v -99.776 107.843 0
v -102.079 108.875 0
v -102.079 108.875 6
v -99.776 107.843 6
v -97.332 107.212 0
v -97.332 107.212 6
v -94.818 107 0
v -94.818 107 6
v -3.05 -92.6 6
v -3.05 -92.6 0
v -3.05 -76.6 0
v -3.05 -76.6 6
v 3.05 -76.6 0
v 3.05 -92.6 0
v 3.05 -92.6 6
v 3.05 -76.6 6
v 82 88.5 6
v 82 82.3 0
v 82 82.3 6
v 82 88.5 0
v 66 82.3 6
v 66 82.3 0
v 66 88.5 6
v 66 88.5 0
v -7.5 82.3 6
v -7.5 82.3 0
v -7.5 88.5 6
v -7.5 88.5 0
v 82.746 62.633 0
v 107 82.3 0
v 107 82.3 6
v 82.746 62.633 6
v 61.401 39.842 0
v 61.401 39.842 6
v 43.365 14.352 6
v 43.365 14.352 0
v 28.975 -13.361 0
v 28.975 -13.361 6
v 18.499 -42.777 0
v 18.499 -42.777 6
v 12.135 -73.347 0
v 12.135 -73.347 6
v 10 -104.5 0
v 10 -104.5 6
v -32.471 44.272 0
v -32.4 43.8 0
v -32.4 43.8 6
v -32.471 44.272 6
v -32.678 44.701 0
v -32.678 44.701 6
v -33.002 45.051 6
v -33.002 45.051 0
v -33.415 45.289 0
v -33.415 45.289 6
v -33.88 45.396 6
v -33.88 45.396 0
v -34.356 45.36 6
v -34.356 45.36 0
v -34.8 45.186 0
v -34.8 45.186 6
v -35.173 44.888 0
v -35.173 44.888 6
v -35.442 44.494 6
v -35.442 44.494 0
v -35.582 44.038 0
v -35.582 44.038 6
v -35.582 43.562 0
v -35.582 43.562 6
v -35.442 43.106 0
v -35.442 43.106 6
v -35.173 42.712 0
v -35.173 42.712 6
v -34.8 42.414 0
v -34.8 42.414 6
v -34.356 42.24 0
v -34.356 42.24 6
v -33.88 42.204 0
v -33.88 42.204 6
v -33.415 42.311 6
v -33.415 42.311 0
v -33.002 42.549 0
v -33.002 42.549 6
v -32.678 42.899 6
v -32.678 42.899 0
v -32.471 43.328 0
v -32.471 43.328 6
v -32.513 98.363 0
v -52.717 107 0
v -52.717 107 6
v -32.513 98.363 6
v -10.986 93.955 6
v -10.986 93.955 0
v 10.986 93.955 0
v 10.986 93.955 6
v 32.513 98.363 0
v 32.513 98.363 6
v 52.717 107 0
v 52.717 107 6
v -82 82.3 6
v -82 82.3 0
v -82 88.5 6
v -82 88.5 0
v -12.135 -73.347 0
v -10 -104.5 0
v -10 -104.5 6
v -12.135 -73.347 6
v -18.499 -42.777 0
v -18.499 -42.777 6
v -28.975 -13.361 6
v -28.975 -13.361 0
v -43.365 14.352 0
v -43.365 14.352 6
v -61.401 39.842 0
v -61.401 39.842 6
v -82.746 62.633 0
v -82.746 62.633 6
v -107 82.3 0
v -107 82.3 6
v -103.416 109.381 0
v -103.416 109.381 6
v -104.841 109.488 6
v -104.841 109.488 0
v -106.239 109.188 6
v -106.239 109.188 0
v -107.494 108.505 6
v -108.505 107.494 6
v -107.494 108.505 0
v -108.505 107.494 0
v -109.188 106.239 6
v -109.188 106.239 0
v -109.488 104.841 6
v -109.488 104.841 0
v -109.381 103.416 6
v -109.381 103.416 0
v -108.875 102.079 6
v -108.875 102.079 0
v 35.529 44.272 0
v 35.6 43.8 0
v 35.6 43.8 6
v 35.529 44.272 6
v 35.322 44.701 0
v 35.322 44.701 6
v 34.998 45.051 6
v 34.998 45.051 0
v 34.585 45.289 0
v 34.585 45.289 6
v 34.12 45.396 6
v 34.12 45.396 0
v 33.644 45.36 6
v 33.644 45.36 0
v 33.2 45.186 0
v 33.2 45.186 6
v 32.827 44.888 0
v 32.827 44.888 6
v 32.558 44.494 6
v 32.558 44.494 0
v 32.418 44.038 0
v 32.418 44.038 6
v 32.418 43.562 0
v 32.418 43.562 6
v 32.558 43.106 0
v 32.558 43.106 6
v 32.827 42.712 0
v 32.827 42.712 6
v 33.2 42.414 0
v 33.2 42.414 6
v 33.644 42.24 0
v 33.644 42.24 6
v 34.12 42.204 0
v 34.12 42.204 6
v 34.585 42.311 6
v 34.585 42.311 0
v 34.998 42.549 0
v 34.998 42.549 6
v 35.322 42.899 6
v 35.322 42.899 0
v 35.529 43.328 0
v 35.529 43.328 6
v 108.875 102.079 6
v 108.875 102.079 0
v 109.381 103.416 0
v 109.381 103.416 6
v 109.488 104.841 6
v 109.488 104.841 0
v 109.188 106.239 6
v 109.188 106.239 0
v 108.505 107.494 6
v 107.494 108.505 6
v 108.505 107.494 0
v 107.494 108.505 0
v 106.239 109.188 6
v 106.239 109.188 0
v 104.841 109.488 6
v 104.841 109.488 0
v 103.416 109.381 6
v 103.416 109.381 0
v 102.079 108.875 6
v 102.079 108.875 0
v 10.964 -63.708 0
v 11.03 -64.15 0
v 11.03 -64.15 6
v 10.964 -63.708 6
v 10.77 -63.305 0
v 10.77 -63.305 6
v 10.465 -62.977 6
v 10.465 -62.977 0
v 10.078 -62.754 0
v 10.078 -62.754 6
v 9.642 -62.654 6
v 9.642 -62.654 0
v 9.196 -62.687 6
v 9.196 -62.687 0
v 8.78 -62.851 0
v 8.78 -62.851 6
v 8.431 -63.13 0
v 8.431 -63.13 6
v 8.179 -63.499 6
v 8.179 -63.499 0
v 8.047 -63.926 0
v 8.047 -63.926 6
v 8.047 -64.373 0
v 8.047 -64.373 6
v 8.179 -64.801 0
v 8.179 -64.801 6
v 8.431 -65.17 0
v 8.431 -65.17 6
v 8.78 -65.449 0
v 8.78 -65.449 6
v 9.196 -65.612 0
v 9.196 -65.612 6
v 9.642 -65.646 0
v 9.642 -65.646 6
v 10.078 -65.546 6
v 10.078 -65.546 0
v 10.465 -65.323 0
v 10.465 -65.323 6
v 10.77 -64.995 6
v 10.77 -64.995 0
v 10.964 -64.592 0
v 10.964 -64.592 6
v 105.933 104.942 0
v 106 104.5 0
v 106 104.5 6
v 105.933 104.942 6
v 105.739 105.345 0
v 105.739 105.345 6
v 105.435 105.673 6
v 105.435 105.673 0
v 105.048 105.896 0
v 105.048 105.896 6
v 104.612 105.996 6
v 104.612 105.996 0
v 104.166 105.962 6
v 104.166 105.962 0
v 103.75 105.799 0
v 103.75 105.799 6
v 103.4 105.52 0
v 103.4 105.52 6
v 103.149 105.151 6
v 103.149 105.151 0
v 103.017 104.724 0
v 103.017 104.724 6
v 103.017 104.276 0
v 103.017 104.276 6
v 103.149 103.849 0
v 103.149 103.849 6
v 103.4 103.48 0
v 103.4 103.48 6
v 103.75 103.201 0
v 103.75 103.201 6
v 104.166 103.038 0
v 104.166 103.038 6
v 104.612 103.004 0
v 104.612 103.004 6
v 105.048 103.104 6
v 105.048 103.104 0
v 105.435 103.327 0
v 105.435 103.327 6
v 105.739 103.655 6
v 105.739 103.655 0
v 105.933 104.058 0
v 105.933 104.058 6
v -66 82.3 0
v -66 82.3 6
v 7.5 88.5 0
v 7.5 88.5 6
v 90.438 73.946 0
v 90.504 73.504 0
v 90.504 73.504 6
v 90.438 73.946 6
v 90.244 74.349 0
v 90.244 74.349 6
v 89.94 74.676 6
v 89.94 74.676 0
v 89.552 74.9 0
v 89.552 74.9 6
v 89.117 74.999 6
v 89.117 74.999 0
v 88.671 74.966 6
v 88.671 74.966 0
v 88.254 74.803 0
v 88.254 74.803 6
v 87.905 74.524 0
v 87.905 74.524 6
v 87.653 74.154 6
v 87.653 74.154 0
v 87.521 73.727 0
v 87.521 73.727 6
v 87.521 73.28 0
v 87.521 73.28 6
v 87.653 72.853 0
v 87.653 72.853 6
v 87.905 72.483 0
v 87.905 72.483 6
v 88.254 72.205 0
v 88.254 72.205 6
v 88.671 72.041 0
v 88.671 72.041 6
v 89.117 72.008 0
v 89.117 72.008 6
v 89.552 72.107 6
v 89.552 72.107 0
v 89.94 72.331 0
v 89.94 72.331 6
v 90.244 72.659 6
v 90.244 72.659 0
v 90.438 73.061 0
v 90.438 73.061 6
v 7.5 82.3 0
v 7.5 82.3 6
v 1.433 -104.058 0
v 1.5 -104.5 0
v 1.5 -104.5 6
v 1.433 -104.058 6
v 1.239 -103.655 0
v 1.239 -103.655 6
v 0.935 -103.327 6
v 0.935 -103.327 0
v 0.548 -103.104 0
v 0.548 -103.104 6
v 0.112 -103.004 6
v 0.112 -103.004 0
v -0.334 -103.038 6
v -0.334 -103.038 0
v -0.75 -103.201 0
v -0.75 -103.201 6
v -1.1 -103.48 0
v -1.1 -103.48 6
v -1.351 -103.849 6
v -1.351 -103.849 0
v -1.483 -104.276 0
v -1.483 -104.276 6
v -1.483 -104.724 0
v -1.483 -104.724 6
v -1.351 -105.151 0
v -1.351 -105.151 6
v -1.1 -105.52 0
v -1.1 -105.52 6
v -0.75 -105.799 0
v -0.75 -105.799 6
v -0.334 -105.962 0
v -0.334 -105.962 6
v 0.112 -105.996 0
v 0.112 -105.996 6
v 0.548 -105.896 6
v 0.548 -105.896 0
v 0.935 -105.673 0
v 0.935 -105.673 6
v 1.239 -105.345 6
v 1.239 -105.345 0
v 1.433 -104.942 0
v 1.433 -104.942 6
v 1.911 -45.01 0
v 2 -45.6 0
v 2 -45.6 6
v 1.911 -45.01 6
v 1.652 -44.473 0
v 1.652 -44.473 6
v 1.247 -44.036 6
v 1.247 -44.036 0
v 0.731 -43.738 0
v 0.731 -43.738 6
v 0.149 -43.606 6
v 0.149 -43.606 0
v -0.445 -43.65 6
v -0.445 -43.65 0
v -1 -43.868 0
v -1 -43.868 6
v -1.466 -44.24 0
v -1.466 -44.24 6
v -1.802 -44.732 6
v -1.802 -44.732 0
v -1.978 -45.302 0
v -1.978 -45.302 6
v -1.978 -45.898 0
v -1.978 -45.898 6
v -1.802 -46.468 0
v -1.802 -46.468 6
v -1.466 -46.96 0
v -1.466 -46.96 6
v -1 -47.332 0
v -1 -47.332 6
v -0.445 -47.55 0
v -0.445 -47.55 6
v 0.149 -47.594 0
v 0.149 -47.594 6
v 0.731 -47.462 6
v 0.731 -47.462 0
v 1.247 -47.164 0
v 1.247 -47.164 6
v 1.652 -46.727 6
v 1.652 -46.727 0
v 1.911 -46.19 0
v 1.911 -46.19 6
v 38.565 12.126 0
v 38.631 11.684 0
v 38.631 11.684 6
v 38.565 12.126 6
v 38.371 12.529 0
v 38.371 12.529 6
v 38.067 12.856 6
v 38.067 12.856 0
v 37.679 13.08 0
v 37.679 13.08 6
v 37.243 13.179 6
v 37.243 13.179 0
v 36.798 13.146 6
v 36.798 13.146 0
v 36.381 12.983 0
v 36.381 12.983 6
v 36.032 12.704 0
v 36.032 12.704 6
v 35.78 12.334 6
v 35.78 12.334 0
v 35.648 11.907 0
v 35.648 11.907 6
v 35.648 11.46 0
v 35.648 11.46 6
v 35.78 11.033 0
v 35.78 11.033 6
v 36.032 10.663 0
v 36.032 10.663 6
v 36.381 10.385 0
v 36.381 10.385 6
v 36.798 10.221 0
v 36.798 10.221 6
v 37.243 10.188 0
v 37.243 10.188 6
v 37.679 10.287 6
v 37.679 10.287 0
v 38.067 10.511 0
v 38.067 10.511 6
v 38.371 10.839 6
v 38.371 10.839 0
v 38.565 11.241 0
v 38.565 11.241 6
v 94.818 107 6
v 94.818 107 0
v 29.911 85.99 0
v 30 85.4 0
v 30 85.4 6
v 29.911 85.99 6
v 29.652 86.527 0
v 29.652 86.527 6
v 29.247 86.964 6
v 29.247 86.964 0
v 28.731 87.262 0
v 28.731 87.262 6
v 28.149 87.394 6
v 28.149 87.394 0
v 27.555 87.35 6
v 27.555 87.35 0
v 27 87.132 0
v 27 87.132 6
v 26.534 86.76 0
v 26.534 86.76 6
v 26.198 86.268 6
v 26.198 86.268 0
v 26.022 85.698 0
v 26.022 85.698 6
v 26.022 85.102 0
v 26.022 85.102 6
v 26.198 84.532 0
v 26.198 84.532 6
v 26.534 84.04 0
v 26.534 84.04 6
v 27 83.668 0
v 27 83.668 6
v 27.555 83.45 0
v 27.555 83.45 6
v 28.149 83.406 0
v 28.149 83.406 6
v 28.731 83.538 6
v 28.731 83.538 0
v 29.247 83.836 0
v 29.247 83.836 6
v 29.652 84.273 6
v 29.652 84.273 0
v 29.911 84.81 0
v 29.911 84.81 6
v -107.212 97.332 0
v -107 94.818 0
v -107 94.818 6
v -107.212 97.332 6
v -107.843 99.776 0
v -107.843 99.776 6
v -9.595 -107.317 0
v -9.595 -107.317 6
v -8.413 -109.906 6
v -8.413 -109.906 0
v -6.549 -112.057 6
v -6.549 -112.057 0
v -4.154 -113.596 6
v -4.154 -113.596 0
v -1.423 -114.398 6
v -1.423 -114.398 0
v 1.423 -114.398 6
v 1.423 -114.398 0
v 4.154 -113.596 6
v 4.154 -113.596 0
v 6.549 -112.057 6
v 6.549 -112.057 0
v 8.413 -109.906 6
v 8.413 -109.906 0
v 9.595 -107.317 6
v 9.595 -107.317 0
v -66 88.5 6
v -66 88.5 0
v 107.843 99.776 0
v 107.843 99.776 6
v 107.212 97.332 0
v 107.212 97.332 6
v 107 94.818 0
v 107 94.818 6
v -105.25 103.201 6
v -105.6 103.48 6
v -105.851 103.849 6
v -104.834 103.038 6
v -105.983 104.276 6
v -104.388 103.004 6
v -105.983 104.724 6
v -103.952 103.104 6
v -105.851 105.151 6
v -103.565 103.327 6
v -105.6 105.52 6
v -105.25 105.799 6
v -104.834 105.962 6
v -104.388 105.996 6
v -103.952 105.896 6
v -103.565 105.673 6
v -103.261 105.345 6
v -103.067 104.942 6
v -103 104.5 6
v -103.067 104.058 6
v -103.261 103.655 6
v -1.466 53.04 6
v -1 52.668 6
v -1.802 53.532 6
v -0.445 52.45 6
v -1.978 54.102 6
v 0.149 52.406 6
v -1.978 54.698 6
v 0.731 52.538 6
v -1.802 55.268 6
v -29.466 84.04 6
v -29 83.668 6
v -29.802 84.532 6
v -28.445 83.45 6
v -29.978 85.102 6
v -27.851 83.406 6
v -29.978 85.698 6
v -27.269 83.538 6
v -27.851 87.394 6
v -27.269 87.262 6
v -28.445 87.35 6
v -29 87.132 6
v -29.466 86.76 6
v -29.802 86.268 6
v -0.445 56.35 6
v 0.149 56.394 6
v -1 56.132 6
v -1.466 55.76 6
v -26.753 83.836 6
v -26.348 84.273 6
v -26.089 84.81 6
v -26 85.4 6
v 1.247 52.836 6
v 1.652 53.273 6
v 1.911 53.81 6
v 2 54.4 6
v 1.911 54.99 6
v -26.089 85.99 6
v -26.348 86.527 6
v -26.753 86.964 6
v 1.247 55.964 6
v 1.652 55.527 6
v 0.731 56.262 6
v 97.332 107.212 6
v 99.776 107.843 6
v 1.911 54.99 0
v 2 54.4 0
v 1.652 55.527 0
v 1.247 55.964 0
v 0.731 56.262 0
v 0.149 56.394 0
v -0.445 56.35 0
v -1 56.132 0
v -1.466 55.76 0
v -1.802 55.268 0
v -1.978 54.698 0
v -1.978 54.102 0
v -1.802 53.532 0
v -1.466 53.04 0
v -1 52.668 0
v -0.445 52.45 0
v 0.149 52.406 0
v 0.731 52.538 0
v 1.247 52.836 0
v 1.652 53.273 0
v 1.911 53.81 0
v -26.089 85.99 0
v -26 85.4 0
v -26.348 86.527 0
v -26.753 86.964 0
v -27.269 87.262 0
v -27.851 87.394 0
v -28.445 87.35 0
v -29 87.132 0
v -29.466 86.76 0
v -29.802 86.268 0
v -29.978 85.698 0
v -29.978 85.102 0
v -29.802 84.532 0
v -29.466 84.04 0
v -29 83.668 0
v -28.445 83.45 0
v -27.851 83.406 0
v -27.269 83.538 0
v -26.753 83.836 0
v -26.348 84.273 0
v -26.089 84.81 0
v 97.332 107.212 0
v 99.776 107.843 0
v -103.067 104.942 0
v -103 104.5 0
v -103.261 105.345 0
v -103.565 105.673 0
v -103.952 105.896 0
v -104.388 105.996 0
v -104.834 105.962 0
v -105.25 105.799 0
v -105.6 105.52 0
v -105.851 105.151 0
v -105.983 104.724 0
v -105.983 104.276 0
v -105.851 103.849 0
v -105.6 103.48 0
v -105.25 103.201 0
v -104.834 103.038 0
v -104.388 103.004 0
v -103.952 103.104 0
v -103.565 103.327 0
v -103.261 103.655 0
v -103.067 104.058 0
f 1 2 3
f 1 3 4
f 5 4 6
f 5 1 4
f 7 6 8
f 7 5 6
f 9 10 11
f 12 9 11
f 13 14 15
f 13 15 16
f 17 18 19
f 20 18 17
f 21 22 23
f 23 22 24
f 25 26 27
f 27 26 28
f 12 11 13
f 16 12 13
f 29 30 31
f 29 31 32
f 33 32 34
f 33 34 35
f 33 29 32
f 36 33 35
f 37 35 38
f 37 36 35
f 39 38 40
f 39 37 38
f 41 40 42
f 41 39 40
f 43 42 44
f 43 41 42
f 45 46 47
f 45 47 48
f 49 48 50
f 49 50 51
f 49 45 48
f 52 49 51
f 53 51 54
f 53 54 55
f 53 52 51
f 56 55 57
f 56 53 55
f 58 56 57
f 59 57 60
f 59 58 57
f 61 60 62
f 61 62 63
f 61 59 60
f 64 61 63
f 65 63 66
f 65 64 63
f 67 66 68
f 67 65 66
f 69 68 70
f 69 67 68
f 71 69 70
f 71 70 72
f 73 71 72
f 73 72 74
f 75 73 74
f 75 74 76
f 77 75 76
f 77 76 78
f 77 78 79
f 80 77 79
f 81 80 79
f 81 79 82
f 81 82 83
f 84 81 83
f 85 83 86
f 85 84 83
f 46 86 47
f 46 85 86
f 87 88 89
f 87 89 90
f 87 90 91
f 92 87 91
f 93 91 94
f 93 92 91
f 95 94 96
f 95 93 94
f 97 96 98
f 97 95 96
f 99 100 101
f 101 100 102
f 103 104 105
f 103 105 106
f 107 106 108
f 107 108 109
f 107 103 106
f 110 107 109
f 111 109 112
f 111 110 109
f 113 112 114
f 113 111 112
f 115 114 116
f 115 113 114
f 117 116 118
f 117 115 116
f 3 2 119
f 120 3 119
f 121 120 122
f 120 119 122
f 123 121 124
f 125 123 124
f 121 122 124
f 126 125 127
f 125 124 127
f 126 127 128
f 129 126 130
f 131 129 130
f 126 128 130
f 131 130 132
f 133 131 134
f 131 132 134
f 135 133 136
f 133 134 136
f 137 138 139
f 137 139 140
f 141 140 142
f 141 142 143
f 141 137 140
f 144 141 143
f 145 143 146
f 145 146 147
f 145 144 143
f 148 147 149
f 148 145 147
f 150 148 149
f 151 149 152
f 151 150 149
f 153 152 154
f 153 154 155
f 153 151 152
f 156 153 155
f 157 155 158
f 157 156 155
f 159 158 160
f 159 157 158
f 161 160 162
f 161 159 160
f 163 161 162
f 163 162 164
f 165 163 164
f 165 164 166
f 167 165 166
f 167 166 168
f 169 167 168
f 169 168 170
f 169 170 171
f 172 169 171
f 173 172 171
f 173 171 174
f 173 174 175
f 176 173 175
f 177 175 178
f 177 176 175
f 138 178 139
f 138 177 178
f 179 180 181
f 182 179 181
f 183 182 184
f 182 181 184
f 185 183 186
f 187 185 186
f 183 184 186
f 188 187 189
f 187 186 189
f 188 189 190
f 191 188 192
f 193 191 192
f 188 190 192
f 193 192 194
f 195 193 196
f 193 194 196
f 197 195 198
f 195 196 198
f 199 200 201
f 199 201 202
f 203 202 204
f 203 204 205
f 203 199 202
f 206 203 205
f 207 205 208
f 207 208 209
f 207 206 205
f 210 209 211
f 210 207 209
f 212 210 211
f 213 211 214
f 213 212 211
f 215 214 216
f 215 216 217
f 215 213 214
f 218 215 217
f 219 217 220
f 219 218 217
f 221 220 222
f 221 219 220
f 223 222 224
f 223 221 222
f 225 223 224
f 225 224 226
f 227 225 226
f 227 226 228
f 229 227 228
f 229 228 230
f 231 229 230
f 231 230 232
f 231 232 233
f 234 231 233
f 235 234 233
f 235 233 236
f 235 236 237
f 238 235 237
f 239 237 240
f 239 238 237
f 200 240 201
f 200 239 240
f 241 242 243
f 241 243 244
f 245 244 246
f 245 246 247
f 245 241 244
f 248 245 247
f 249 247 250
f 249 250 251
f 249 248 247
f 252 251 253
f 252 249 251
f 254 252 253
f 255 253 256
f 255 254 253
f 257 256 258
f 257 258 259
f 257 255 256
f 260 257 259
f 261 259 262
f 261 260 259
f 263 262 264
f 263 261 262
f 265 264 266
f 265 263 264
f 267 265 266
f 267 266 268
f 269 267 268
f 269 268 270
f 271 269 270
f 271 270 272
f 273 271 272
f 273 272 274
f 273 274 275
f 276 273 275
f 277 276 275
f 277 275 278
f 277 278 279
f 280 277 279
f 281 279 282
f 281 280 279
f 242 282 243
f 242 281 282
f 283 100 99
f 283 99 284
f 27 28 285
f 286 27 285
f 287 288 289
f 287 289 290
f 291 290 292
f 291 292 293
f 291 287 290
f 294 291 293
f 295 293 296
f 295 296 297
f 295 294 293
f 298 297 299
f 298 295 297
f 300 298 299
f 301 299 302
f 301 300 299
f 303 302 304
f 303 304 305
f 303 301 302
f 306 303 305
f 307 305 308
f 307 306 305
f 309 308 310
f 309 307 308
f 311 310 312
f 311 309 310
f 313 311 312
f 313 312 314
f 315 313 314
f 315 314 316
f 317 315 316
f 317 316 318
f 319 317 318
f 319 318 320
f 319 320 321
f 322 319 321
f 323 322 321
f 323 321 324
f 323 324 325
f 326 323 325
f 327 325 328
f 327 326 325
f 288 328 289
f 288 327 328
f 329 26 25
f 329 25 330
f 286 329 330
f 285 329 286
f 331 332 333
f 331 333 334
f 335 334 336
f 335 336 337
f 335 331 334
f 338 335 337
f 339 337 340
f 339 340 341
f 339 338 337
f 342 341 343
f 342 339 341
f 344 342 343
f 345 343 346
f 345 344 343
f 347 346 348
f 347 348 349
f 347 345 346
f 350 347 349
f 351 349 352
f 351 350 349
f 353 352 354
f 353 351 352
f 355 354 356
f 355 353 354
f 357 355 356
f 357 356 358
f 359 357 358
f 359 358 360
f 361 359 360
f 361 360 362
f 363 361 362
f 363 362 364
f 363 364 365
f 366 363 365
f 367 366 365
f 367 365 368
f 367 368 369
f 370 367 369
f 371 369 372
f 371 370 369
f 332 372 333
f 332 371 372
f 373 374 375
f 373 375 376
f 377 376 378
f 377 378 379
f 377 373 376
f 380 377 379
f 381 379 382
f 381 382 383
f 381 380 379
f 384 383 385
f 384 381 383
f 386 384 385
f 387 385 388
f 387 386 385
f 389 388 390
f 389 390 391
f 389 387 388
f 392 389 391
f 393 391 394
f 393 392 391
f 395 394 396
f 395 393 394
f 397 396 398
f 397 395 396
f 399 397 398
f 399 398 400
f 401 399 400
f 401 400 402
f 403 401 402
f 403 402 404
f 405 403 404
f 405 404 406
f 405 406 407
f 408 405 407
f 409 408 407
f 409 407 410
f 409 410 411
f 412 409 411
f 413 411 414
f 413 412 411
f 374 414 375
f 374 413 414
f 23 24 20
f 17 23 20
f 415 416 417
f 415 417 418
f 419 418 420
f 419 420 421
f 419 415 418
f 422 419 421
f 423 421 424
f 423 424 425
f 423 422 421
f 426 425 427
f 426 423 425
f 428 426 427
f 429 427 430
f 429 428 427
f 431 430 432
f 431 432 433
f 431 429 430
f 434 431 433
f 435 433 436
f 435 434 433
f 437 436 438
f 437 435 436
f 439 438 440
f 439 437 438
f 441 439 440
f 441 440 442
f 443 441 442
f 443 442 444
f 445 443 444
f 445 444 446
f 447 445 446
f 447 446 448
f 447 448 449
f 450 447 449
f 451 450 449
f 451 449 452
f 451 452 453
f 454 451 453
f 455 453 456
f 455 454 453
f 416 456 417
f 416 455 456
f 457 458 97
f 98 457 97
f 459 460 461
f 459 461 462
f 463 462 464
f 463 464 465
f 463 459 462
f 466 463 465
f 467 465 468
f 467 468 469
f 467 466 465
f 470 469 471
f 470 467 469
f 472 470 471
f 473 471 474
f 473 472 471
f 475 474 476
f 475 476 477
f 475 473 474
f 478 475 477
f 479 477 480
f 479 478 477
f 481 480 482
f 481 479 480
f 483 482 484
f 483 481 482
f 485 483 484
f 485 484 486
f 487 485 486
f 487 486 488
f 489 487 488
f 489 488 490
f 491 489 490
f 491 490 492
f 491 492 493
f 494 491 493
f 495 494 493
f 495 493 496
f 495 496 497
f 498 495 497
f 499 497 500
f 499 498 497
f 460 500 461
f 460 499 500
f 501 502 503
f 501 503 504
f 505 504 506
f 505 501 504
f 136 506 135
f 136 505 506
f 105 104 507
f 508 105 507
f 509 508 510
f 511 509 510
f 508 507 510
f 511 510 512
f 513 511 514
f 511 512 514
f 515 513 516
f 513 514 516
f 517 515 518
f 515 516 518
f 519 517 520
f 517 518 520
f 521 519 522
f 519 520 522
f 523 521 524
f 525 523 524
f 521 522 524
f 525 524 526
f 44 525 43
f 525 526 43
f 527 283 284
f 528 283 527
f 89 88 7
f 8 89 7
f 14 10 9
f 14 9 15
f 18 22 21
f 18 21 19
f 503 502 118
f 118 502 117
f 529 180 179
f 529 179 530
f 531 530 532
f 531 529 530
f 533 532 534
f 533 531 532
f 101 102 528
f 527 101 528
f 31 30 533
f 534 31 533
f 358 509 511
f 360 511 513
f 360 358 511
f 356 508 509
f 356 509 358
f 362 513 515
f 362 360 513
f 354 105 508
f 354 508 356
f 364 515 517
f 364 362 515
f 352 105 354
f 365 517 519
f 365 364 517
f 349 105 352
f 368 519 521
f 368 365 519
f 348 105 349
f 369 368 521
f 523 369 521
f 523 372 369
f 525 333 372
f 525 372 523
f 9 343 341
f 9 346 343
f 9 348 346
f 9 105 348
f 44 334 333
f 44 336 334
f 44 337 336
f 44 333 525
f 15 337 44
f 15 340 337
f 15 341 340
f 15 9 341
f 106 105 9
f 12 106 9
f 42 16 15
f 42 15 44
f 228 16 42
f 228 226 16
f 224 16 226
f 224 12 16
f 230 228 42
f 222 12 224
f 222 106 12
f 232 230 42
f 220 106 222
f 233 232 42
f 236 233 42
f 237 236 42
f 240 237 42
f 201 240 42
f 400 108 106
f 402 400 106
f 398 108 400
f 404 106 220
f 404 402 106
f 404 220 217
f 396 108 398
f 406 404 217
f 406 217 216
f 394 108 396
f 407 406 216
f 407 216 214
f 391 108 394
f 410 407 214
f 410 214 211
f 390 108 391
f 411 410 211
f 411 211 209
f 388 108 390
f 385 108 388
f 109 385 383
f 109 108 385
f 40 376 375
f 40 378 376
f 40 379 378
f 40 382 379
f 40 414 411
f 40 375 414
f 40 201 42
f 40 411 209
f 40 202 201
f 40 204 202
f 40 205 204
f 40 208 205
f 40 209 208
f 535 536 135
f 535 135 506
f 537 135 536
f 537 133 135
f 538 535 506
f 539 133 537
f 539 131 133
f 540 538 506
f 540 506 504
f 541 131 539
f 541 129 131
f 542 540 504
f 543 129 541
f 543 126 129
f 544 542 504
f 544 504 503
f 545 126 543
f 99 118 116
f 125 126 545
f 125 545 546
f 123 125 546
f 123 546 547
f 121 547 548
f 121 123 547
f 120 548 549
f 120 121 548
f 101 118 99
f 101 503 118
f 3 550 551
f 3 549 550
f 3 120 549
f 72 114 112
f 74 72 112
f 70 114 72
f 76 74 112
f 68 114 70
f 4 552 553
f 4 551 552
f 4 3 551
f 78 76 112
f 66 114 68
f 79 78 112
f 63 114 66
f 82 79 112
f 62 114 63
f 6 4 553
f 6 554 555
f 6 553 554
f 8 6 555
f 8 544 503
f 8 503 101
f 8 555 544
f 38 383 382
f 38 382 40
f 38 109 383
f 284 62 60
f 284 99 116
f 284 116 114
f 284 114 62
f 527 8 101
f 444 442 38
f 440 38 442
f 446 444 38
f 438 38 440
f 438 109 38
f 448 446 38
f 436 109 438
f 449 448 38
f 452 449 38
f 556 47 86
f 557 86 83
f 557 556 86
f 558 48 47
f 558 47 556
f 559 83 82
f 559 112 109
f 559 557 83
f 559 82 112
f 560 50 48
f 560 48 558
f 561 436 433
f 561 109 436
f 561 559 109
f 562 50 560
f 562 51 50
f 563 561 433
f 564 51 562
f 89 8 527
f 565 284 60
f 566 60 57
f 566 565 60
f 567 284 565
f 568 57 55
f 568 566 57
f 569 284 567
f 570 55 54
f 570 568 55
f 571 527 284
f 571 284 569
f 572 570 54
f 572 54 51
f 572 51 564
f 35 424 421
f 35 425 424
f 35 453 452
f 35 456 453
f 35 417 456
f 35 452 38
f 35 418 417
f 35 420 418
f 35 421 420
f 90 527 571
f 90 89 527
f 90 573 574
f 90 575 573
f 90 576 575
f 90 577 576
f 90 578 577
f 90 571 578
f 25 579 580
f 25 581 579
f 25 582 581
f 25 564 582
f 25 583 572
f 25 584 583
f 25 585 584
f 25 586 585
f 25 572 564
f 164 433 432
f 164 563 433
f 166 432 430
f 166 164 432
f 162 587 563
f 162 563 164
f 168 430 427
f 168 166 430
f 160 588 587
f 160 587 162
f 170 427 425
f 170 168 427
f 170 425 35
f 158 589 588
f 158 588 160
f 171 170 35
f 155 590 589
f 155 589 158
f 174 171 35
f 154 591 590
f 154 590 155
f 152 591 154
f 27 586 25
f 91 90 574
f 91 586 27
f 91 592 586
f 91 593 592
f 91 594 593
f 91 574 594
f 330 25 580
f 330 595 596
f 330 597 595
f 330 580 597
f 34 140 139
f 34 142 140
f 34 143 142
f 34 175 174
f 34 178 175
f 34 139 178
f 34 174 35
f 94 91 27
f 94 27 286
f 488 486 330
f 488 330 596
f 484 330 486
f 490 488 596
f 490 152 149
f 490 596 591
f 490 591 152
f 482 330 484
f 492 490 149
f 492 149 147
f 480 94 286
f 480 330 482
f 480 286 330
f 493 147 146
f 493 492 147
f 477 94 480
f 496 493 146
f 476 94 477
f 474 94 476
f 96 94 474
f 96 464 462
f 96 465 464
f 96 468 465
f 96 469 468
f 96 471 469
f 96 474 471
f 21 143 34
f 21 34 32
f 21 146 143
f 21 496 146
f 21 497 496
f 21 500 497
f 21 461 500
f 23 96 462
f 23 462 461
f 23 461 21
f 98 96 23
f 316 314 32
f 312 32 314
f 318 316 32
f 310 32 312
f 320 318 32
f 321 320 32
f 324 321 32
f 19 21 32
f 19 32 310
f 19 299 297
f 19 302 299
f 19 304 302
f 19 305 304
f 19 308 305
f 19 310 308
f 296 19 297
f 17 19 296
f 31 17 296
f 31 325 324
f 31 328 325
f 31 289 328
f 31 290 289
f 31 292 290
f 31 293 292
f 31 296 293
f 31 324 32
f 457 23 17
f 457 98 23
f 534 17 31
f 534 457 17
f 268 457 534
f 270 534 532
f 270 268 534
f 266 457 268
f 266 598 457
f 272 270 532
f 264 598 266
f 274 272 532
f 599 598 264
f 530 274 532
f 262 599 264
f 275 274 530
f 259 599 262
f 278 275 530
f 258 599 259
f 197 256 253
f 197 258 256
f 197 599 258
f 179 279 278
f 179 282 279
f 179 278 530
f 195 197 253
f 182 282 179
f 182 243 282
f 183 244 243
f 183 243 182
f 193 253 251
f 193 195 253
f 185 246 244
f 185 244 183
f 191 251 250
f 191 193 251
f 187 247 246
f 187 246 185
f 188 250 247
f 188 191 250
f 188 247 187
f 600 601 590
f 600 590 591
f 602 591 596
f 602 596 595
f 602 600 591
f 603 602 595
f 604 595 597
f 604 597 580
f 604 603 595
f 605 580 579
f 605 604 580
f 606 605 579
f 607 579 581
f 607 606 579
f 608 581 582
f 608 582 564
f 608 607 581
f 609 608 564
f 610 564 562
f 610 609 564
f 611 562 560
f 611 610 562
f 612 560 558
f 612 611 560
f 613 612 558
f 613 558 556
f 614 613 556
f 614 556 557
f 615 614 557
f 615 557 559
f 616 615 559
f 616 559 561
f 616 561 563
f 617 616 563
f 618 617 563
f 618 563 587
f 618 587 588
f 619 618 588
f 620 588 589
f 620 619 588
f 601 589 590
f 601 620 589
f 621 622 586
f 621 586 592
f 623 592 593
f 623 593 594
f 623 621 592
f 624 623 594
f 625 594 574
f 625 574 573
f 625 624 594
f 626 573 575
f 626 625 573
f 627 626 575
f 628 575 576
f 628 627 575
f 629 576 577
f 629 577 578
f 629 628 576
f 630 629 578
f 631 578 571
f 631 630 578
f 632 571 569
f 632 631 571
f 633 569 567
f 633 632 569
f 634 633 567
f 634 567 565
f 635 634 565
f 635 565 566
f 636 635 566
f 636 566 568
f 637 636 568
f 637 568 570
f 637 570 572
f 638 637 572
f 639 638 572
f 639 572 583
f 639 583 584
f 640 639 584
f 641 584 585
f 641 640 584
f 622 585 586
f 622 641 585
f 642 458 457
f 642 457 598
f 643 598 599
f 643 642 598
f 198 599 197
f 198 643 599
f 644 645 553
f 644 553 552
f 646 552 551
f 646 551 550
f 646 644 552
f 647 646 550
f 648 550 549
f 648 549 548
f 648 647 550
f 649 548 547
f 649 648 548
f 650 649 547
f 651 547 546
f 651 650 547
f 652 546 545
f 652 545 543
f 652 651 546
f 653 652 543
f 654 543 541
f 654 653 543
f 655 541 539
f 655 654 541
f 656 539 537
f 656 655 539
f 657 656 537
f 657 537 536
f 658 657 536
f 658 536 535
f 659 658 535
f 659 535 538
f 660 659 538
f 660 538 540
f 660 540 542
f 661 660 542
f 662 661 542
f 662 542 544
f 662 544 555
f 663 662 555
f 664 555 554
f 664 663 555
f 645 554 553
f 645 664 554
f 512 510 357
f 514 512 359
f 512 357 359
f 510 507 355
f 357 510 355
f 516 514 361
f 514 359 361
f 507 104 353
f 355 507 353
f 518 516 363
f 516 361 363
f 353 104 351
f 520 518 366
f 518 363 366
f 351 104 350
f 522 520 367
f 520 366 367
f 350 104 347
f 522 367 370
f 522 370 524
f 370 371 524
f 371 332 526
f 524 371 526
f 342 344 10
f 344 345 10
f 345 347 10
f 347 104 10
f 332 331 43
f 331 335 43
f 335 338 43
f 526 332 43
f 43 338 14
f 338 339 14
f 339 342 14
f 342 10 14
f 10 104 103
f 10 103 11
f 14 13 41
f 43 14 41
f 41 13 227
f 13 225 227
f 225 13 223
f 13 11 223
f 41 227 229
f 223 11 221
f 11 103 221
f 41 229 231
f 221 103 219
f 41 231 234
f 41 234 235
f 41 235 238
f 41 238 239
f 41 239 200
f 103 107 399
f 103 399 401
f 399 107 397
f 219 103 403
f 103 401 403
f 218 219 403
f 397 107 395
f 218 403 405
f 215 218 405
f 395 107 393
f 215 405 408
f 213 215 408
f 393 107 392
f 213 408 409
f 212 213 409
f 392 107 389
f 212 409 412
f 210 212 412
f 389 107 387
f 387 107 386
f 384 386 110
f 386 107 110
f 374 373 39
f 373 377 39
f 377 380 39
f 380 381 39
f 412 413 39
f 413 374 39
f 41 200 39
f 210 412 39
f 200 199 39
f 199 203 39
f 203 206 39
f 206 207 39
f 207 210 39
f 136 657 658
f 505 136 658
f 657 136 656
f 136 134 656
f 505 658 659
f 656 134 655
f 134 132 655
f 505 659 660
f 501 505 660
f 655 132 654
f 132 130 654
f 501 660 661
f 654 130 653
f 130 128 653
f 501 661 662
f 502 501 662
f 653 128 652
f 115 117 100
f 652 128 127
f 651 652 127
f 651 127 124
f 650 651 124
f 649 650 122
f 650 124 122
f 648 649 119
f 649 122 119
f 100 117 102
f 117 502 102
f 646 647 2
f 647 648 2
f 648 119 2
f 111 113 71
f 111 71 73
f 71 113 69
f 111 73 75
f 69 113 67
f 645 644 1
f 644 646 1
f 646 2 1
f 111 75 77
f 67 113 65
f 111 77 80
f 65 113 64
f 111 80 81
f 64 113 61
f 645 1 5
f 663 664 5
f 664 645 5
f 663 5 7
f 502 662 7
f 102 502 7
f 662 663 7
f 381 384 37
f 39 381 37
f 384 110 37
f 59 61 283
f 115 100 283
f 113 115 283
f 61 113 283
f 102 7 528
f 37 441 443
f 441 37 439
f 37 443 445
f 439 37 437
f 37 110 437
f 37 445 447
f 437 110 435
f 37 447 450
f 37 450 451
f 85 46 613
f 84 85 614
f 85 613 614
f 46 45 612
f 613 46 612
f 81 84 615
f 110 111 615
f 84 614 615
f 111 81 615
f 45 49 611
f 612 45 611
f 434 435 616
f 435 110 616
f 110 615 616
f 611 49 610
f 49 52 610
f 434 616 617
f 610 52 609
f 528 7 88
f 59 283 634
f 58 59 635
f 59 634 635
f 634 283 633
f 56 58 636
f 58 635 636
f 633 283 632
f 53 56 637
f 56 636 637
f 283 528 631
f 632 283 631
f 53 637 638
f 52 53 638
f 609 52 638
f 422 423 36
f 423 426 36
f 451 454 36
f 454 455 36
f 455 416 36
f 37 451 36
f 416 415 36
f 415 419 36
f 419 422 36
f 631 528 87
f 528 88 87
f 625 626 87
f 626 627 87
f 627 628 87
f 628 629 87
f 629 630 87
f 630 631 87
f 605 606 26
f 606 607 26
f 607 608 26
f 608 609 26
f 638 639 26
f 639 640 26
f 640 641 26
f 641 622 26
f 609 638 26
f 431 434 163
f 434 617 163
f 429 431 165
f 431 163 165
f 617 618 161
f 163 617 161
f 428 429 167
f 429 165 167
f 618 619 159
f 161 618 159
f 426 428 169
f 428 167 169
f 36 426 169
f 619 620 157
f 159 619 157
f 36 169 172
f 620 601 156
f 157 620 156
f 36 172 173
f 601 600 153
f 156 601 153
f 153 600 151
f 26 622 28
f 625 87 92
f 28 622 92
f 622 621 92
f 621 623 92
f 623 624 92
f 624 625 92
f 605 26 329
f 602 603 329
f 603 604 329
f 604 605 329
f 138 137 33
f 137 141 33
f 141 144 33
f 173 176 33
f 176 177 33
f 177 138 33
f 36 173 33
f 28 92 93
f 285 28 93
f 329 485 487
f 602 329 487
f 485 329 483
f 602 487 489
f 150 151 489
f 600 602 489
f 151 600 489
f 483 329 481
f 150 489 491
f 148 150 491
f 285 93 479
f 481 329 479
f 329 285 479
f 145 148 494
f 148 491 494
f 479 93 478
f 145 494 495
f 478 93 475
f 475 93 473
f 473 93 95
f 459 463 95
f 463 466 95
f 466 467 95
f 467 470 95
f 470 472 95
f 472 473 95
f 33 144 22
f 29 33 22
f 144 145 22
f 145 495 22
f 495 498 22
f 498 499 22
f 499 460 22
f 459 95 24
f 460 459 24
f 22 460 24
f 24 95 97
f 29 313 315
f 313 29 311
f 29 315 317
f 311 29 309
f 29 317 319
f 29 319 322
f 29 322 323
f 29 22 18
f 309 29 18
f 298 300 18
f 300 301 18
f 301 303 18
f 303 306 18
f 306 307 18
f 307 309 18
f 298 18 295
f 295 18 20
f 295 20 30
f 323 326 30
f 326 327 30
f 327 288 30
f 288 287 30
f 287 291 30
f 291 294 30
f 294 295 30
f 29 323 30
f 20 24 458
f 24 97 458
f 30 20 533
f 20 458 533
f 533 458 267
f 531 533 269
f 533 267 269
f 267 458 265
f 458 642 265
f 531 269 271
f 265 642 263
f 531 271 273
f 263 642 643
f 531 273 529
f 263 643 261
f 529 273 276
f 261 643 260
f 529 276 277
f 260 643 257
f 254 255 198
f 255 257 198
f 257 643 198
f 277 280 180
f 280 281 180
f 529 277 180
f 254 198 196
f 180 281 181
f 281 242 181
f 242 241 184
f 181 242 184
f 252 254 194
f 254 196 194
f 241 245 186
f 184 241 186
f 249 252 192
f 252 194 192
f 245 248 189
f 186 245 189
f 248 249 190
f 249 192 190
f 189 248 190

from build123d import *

# Parameters (mm, degrees)
SKETCH042_R   = 1.6
SKETCH042_R_2 = 1.5
SKETCH042_R_3 = 2
SKETCH042_W   = 15
SKETCH042_H   = 6.2
SKETCH042_W_2 = 16
SKETCH042_W_3 = 6.1
SKETCH042_H_2 = 16
PAD_DEPTH     = 6


with BuildPart() as part:
    # Sketch042 → Pad (new body)
    with BuildSketch(Plane.XY):
        with BuildLine():
            ThreePointArc((-10, -104.5), (0, -114.5), (10, -104.5))
            ThreePointArc((107, 82.3), (35.695621, 0.741674), (10, -104.5))
            Line((107, 82.3), (107, 94.817542))
            ThreePointArc((108.875, 102.079385), (107.476312, 98.567542), (107, 94.817542))
            ThreePointArc((108.875, 102.079385), (108.035534, 108.035534), (102.079385, 108.875))
            ThreePointArc((94.817542, 107), (98.567542, 107.476312), (102.079385, 108.875))
            Line((94.817542, 107), (52.717063, 107))
            ThreePointArc((-52.717063, 107), (0, 93.4), (52.717063, 107))
            Line((-52.717063, 107), (-94.817542, 107))
            ThreePointArc((-102.079385, 108.875), (-98.567542, 107.476312), (-94.817542, 107))
            ThreePointArc((-102.079385, 108.875), (-108.035534, 108.035534), (-108.875, 102.079385))
            ThreePointArc((-107, 94.817542), (-107.476312, 98.567542), (-108.875, 102.079385))
            Line((-107, 94.817542), (-107, 82.3))
            ThreePointArc((-10, -104.5), (-35.695621, 0.741674), (-107, 82.3))
        make_face()
        with Locations((34, 43.8)):
            Circle(SKETCH042_R, mode=Mode.SUBTRACT)
        with Locations((9.53018, -64.149856)):
            Circle(SKETCH042_R_2, mode=Mode.SUBTRACT)
        with Locations((-104.5, 104.5)):
            Circle(SKETCH042_R_2, mode=Mode.SUBTRACT)
        with Locations((28, 85.4)):
            Circle(SKETCH042_R_3, mode=Mode.SUBTRACT)
        with Locations((0, -104.5)):
            Circle(SKETCH042_R_2, mode=Mode.SUBTRACT)
        with Locations((-28, 85.4)):
            Circle(SKETCH042_R_3, mode=Mode.SUBTRACT)
        with Locations((-34, 43.8)):
            Circle(SKETCH042_R, mode=Mode.SUBTRACT)
        with Locations((0, 54.4)):
            Circle(SKETCH042_R_3, mode=Mode.SUBTRACT)
        with Locations((0, -45.6)):
            Circle(SKETCH042_R_3, mode=Mode.SUBTRACT)
        with Locations((104.5, 104.5)):
            Circle(SKETCH042_R_2, mode=Mode.SUBTRACT)
        with Locations((37.131304, 11.683608)):
            Circle(SKETCH042_R_2, mode=Mode.SUBTRACT)
        with Locations((89.004449, 73.503615)):
            Circle(SKETCH042_R_2, mode=Mode.SUBTRACT)
        with Locations((0, 85.4)):
            Rectangle(SKETCH042_W, SKETCH042_H, mode=Mode.SUBTRACT)
        with Locations((74, 85.4)):
            Rectangle(SKETCH042_W_2, SKETCH042_H, mode=Mode.SUBTRACT)
        with Locations((0, -84.6)):
            Rectangle(SKETCH042_W_3, SKETCH042_H_2, mode=Mode.SUBTRACT)
        with Locations((-74, 85.4)):
            Rectangle(SKETCH042_W_2, SKETCH042_H, mode=Mode.SUBTRACT)
    extrude(amount=PAD_DEPTH)


solid = part.part
